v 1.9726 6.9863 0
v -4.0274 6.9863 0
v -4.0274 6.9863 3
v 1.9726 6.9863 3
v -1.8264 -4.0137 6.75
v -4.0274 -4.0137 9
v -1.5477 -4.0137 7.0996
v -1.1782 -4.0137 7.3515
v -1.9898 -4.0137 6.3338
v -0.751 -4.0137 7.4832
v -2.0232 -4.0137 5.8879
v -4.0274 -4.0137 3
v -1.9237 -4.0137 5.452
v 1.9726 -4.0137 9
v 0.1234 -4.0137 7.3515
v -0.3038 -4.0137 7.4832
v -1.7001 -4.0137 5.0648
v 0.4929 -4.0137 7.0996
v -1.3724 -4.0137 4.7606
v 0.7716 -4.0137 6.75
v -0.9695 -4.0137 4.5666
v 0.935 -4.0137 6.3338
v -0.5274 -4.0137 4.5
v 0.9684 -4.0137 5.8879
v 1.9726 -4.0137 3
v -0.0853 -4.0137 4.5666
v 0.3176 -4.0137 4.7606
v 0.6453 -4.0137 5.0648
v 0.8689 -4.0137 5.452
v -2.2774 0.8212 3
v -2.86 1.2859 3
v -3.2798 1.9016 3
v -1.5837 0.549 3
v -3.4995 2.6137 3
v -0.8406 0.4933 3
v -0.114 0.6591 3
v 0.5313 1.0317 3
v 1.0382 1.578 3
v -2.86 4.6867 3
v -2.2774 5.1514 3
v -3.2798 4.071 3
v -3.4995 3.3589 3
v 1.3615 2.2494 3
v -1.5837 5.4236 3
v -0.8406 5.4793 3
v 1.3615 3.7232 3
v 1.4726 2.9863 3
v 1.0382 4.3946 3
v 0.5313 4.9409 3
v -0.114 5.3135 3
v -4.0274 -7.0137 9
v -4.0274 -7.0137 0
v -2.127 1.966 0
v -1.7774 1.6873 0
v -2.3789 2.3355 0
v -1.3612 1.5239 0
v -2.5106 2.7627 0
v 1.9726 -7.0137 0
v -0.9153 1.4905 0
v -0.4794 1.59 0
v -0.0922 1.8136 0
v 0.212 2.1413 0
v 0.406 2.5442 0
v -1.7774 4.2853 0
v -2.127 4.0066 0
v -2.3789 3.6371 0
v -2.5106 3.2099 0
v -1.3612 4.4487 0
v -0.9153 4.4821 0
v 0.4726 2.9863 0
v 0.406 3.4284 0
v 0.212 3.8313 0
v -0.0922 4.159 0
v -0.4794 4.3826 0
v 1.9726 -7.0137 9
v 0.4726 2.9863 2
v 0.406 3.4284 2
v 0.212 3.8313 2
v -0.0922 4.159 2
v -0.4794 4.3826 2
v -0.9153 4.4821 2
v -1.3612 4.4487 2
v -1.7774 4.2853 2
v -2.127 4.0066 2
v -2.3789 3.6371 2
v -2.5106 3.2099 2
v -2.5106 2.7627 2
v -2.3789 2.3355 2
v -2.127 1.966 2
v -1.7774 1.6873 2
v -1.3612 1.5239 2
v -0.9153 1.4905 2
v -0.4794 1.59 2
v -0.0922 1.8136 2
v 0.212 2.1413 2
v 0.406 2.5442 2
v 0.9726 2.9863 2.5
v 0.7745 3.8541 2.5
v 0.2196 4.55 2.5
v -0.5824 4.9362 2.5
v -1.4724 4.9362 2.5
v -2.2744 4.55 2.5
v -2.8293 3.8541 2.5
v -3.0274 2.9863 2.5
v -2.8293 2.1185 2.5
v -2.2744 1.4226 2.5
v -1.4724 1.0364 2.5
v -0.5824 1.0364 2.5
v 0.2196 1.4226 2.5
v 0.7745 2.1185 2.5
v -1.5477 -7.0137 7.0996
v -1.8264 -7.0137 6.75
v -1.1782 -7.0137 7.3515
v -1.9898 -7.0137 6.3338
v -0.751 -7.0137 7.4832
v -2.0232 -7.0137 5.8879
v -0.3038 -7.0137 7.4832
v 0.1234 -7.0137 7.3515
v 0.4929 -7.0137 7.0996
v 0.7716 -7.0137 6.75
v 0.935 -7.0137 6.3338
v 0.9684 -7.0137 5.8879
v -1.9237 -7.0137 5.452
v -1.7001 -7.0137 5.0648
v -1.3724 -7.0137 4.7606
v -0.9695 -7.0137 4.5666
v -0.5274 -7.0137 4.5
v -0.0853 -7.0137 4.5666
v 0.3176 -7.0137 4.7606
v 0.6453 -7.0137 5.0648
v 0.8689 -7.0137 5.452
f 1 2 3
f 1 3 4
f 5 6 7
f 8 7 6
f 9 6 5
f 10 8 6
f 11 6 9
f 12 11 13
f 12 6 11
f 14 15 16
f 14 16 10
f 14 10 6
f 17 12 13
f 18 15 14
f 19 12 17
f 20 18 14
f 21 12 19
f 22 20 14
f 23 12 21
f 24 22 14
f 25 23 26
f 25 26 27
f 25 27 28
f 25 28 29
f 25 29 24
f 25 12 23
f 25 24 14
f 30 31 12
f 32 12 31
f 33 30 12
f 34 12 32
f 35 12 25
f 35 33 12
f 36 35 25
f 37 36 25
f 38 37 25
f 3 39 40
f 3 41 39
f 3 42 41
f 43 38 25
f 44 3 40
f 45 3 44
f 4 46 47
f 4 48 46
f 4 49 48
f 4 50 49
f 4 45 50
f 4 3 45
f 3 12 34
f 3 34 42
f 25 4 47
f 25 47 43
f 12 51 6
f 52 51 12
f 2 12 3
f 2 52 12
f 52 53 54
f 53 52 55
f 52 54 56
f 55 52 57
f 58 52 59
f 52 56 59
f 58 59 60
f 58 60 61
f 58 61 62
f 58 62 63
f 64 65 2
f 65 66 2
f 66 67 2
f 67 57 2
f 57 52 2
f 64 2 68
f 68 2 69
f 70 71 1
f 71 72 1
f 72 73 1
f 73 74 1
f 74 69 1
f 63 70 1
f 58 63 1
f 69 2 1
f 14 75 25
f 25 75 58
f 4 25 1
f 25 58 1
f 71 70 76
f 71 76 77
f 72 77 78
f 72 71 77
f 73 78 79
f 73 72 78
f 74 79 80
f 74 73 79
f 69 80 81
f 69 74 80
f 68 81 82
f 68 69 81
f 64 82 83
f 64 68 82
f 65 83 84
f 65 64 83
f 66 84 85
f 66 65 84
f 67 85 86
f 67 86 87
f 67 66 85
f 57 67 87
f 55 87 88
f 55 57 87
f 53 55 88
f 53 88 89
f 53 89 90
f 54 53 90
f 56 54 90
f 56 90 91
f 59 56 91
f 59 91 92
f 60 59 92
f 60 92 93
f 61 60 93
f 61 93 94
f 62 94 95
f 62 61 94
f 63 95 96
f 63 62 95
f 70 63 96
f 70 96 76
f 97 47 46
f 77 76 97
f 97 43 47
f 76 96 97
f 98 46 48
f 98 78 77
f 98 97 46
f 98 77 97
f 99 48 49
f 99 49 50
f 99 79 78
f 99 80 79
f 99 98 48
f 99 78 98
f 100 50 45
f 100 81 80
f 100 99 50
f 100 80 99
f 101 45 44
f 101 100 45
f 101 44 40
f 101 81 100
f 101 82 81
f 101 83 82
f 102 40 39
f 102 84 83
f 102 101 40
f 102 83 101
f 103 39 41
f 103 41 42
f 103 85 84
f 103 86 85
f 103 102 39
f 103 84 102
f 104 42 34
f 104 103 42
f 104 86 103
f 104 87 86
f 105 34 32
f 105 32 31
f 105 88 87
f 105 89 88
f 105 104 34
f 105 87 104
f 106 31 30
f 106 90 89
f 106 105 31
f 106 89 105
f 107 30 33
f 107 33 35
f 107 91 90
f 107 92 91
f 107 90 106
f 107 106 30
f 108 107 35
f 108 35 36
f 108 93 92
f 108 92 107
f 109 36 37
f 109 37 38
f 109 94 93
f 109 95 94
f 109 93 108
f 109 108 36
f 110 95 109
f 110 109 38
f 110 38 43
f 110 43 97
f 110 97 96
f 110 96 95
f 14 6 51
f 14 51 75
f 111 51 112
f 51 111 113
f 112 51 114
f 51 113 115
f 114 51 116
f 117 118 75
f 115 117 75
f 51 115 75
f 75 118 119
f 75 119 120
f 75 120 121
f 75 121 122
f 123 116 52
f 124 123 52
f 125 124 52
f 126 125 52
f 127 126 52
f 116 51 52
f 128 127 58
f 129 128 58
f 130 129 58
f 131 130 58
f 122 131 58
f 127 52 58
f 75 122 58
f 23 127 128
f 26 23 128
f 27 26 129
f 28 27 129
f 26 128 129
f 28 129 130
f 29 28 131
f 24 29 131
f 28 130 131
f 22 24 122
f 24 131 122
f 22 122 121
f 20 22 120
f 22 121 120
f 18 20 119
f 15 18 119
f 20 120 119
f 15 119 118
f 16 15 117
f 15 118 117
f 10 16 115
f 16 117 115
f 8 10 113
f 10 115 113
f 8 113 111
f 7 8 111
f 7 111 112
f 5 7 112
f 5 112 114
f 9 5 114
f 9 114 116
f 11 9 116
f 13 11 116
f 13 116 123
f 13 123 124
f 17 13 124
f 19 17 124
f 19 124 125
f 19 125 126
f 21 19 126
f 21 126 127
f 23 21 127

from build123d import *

# Parameters (mm, degrees)
ESQUISSE1_W             = 6
ESQUISSE1_H             = 14
ESQUISSE1_R             = 1.5
BOSS_EXTRU_1_DEPTH      = 3
ESQUISSE2_W             = 6
ESQUISSE2_H             = 3
BOSS_EXTRU_2_DEPTH      = 6
ESQUISSE3_R             = 1.5
ENL_V_MAT_EXTRU_1_DEPTH = 10
CHANFREIN3_SIZE         = 1


with BuildPart() as part:
    # Esquisse1 → Boss.-Extru.1 (new body)
    with BuildSketch(Plane.XY):
        with Locations((-1.02739726, -0.01369863)):
            Rectangle(ESQUISSE1_W, ESQUISSE1_H)
        with Locations((-1.02739726, 2.98630137)):
            Circle(ESQUISSE1_R, mode=Mode.SUBTRACT)
    extrude(amount=BOSS_EXTRU_1_DEPTH)

    # Esquisse2 → Boss.-Extru.2 (add)
    with BuildSketch(Plane.XY.offset(3)):
        with Locations((-1.02739726, -5.51369863)):
            Rectangle(ESQUISSE2_W, ESQUISSE2_H)
    extrude(amount=BOSS_EXTRU_2_DEPTH)

    # Esquisse3 → Enlèv. mat.-Extru.1 (cut)
    with BuildSketch(Plane(origin=(0, -7.01369863, 0), x_dir=(-1, 0, 0), z_dir=(0, -1, 0))):
        with Locations(Location((0.52739726, -6, 0), (0, 0, 90))):
            Circle(ESQUISSE3_R)
    extrude(amount=-ENL_V_MAT_EXTRU_1_DEPTH, mode=Mode.SUBTRACT)

    # Chanfrein3
    chanfrein3_edges = [part.edges().sort_by_distance(p)[0] for p in [
        (-2.52739726, 2.98630137, 3),
    ]]
    chamfer(chanfrein3_edges, length=CHANFREIN3_SIZE)


solid = part.part
